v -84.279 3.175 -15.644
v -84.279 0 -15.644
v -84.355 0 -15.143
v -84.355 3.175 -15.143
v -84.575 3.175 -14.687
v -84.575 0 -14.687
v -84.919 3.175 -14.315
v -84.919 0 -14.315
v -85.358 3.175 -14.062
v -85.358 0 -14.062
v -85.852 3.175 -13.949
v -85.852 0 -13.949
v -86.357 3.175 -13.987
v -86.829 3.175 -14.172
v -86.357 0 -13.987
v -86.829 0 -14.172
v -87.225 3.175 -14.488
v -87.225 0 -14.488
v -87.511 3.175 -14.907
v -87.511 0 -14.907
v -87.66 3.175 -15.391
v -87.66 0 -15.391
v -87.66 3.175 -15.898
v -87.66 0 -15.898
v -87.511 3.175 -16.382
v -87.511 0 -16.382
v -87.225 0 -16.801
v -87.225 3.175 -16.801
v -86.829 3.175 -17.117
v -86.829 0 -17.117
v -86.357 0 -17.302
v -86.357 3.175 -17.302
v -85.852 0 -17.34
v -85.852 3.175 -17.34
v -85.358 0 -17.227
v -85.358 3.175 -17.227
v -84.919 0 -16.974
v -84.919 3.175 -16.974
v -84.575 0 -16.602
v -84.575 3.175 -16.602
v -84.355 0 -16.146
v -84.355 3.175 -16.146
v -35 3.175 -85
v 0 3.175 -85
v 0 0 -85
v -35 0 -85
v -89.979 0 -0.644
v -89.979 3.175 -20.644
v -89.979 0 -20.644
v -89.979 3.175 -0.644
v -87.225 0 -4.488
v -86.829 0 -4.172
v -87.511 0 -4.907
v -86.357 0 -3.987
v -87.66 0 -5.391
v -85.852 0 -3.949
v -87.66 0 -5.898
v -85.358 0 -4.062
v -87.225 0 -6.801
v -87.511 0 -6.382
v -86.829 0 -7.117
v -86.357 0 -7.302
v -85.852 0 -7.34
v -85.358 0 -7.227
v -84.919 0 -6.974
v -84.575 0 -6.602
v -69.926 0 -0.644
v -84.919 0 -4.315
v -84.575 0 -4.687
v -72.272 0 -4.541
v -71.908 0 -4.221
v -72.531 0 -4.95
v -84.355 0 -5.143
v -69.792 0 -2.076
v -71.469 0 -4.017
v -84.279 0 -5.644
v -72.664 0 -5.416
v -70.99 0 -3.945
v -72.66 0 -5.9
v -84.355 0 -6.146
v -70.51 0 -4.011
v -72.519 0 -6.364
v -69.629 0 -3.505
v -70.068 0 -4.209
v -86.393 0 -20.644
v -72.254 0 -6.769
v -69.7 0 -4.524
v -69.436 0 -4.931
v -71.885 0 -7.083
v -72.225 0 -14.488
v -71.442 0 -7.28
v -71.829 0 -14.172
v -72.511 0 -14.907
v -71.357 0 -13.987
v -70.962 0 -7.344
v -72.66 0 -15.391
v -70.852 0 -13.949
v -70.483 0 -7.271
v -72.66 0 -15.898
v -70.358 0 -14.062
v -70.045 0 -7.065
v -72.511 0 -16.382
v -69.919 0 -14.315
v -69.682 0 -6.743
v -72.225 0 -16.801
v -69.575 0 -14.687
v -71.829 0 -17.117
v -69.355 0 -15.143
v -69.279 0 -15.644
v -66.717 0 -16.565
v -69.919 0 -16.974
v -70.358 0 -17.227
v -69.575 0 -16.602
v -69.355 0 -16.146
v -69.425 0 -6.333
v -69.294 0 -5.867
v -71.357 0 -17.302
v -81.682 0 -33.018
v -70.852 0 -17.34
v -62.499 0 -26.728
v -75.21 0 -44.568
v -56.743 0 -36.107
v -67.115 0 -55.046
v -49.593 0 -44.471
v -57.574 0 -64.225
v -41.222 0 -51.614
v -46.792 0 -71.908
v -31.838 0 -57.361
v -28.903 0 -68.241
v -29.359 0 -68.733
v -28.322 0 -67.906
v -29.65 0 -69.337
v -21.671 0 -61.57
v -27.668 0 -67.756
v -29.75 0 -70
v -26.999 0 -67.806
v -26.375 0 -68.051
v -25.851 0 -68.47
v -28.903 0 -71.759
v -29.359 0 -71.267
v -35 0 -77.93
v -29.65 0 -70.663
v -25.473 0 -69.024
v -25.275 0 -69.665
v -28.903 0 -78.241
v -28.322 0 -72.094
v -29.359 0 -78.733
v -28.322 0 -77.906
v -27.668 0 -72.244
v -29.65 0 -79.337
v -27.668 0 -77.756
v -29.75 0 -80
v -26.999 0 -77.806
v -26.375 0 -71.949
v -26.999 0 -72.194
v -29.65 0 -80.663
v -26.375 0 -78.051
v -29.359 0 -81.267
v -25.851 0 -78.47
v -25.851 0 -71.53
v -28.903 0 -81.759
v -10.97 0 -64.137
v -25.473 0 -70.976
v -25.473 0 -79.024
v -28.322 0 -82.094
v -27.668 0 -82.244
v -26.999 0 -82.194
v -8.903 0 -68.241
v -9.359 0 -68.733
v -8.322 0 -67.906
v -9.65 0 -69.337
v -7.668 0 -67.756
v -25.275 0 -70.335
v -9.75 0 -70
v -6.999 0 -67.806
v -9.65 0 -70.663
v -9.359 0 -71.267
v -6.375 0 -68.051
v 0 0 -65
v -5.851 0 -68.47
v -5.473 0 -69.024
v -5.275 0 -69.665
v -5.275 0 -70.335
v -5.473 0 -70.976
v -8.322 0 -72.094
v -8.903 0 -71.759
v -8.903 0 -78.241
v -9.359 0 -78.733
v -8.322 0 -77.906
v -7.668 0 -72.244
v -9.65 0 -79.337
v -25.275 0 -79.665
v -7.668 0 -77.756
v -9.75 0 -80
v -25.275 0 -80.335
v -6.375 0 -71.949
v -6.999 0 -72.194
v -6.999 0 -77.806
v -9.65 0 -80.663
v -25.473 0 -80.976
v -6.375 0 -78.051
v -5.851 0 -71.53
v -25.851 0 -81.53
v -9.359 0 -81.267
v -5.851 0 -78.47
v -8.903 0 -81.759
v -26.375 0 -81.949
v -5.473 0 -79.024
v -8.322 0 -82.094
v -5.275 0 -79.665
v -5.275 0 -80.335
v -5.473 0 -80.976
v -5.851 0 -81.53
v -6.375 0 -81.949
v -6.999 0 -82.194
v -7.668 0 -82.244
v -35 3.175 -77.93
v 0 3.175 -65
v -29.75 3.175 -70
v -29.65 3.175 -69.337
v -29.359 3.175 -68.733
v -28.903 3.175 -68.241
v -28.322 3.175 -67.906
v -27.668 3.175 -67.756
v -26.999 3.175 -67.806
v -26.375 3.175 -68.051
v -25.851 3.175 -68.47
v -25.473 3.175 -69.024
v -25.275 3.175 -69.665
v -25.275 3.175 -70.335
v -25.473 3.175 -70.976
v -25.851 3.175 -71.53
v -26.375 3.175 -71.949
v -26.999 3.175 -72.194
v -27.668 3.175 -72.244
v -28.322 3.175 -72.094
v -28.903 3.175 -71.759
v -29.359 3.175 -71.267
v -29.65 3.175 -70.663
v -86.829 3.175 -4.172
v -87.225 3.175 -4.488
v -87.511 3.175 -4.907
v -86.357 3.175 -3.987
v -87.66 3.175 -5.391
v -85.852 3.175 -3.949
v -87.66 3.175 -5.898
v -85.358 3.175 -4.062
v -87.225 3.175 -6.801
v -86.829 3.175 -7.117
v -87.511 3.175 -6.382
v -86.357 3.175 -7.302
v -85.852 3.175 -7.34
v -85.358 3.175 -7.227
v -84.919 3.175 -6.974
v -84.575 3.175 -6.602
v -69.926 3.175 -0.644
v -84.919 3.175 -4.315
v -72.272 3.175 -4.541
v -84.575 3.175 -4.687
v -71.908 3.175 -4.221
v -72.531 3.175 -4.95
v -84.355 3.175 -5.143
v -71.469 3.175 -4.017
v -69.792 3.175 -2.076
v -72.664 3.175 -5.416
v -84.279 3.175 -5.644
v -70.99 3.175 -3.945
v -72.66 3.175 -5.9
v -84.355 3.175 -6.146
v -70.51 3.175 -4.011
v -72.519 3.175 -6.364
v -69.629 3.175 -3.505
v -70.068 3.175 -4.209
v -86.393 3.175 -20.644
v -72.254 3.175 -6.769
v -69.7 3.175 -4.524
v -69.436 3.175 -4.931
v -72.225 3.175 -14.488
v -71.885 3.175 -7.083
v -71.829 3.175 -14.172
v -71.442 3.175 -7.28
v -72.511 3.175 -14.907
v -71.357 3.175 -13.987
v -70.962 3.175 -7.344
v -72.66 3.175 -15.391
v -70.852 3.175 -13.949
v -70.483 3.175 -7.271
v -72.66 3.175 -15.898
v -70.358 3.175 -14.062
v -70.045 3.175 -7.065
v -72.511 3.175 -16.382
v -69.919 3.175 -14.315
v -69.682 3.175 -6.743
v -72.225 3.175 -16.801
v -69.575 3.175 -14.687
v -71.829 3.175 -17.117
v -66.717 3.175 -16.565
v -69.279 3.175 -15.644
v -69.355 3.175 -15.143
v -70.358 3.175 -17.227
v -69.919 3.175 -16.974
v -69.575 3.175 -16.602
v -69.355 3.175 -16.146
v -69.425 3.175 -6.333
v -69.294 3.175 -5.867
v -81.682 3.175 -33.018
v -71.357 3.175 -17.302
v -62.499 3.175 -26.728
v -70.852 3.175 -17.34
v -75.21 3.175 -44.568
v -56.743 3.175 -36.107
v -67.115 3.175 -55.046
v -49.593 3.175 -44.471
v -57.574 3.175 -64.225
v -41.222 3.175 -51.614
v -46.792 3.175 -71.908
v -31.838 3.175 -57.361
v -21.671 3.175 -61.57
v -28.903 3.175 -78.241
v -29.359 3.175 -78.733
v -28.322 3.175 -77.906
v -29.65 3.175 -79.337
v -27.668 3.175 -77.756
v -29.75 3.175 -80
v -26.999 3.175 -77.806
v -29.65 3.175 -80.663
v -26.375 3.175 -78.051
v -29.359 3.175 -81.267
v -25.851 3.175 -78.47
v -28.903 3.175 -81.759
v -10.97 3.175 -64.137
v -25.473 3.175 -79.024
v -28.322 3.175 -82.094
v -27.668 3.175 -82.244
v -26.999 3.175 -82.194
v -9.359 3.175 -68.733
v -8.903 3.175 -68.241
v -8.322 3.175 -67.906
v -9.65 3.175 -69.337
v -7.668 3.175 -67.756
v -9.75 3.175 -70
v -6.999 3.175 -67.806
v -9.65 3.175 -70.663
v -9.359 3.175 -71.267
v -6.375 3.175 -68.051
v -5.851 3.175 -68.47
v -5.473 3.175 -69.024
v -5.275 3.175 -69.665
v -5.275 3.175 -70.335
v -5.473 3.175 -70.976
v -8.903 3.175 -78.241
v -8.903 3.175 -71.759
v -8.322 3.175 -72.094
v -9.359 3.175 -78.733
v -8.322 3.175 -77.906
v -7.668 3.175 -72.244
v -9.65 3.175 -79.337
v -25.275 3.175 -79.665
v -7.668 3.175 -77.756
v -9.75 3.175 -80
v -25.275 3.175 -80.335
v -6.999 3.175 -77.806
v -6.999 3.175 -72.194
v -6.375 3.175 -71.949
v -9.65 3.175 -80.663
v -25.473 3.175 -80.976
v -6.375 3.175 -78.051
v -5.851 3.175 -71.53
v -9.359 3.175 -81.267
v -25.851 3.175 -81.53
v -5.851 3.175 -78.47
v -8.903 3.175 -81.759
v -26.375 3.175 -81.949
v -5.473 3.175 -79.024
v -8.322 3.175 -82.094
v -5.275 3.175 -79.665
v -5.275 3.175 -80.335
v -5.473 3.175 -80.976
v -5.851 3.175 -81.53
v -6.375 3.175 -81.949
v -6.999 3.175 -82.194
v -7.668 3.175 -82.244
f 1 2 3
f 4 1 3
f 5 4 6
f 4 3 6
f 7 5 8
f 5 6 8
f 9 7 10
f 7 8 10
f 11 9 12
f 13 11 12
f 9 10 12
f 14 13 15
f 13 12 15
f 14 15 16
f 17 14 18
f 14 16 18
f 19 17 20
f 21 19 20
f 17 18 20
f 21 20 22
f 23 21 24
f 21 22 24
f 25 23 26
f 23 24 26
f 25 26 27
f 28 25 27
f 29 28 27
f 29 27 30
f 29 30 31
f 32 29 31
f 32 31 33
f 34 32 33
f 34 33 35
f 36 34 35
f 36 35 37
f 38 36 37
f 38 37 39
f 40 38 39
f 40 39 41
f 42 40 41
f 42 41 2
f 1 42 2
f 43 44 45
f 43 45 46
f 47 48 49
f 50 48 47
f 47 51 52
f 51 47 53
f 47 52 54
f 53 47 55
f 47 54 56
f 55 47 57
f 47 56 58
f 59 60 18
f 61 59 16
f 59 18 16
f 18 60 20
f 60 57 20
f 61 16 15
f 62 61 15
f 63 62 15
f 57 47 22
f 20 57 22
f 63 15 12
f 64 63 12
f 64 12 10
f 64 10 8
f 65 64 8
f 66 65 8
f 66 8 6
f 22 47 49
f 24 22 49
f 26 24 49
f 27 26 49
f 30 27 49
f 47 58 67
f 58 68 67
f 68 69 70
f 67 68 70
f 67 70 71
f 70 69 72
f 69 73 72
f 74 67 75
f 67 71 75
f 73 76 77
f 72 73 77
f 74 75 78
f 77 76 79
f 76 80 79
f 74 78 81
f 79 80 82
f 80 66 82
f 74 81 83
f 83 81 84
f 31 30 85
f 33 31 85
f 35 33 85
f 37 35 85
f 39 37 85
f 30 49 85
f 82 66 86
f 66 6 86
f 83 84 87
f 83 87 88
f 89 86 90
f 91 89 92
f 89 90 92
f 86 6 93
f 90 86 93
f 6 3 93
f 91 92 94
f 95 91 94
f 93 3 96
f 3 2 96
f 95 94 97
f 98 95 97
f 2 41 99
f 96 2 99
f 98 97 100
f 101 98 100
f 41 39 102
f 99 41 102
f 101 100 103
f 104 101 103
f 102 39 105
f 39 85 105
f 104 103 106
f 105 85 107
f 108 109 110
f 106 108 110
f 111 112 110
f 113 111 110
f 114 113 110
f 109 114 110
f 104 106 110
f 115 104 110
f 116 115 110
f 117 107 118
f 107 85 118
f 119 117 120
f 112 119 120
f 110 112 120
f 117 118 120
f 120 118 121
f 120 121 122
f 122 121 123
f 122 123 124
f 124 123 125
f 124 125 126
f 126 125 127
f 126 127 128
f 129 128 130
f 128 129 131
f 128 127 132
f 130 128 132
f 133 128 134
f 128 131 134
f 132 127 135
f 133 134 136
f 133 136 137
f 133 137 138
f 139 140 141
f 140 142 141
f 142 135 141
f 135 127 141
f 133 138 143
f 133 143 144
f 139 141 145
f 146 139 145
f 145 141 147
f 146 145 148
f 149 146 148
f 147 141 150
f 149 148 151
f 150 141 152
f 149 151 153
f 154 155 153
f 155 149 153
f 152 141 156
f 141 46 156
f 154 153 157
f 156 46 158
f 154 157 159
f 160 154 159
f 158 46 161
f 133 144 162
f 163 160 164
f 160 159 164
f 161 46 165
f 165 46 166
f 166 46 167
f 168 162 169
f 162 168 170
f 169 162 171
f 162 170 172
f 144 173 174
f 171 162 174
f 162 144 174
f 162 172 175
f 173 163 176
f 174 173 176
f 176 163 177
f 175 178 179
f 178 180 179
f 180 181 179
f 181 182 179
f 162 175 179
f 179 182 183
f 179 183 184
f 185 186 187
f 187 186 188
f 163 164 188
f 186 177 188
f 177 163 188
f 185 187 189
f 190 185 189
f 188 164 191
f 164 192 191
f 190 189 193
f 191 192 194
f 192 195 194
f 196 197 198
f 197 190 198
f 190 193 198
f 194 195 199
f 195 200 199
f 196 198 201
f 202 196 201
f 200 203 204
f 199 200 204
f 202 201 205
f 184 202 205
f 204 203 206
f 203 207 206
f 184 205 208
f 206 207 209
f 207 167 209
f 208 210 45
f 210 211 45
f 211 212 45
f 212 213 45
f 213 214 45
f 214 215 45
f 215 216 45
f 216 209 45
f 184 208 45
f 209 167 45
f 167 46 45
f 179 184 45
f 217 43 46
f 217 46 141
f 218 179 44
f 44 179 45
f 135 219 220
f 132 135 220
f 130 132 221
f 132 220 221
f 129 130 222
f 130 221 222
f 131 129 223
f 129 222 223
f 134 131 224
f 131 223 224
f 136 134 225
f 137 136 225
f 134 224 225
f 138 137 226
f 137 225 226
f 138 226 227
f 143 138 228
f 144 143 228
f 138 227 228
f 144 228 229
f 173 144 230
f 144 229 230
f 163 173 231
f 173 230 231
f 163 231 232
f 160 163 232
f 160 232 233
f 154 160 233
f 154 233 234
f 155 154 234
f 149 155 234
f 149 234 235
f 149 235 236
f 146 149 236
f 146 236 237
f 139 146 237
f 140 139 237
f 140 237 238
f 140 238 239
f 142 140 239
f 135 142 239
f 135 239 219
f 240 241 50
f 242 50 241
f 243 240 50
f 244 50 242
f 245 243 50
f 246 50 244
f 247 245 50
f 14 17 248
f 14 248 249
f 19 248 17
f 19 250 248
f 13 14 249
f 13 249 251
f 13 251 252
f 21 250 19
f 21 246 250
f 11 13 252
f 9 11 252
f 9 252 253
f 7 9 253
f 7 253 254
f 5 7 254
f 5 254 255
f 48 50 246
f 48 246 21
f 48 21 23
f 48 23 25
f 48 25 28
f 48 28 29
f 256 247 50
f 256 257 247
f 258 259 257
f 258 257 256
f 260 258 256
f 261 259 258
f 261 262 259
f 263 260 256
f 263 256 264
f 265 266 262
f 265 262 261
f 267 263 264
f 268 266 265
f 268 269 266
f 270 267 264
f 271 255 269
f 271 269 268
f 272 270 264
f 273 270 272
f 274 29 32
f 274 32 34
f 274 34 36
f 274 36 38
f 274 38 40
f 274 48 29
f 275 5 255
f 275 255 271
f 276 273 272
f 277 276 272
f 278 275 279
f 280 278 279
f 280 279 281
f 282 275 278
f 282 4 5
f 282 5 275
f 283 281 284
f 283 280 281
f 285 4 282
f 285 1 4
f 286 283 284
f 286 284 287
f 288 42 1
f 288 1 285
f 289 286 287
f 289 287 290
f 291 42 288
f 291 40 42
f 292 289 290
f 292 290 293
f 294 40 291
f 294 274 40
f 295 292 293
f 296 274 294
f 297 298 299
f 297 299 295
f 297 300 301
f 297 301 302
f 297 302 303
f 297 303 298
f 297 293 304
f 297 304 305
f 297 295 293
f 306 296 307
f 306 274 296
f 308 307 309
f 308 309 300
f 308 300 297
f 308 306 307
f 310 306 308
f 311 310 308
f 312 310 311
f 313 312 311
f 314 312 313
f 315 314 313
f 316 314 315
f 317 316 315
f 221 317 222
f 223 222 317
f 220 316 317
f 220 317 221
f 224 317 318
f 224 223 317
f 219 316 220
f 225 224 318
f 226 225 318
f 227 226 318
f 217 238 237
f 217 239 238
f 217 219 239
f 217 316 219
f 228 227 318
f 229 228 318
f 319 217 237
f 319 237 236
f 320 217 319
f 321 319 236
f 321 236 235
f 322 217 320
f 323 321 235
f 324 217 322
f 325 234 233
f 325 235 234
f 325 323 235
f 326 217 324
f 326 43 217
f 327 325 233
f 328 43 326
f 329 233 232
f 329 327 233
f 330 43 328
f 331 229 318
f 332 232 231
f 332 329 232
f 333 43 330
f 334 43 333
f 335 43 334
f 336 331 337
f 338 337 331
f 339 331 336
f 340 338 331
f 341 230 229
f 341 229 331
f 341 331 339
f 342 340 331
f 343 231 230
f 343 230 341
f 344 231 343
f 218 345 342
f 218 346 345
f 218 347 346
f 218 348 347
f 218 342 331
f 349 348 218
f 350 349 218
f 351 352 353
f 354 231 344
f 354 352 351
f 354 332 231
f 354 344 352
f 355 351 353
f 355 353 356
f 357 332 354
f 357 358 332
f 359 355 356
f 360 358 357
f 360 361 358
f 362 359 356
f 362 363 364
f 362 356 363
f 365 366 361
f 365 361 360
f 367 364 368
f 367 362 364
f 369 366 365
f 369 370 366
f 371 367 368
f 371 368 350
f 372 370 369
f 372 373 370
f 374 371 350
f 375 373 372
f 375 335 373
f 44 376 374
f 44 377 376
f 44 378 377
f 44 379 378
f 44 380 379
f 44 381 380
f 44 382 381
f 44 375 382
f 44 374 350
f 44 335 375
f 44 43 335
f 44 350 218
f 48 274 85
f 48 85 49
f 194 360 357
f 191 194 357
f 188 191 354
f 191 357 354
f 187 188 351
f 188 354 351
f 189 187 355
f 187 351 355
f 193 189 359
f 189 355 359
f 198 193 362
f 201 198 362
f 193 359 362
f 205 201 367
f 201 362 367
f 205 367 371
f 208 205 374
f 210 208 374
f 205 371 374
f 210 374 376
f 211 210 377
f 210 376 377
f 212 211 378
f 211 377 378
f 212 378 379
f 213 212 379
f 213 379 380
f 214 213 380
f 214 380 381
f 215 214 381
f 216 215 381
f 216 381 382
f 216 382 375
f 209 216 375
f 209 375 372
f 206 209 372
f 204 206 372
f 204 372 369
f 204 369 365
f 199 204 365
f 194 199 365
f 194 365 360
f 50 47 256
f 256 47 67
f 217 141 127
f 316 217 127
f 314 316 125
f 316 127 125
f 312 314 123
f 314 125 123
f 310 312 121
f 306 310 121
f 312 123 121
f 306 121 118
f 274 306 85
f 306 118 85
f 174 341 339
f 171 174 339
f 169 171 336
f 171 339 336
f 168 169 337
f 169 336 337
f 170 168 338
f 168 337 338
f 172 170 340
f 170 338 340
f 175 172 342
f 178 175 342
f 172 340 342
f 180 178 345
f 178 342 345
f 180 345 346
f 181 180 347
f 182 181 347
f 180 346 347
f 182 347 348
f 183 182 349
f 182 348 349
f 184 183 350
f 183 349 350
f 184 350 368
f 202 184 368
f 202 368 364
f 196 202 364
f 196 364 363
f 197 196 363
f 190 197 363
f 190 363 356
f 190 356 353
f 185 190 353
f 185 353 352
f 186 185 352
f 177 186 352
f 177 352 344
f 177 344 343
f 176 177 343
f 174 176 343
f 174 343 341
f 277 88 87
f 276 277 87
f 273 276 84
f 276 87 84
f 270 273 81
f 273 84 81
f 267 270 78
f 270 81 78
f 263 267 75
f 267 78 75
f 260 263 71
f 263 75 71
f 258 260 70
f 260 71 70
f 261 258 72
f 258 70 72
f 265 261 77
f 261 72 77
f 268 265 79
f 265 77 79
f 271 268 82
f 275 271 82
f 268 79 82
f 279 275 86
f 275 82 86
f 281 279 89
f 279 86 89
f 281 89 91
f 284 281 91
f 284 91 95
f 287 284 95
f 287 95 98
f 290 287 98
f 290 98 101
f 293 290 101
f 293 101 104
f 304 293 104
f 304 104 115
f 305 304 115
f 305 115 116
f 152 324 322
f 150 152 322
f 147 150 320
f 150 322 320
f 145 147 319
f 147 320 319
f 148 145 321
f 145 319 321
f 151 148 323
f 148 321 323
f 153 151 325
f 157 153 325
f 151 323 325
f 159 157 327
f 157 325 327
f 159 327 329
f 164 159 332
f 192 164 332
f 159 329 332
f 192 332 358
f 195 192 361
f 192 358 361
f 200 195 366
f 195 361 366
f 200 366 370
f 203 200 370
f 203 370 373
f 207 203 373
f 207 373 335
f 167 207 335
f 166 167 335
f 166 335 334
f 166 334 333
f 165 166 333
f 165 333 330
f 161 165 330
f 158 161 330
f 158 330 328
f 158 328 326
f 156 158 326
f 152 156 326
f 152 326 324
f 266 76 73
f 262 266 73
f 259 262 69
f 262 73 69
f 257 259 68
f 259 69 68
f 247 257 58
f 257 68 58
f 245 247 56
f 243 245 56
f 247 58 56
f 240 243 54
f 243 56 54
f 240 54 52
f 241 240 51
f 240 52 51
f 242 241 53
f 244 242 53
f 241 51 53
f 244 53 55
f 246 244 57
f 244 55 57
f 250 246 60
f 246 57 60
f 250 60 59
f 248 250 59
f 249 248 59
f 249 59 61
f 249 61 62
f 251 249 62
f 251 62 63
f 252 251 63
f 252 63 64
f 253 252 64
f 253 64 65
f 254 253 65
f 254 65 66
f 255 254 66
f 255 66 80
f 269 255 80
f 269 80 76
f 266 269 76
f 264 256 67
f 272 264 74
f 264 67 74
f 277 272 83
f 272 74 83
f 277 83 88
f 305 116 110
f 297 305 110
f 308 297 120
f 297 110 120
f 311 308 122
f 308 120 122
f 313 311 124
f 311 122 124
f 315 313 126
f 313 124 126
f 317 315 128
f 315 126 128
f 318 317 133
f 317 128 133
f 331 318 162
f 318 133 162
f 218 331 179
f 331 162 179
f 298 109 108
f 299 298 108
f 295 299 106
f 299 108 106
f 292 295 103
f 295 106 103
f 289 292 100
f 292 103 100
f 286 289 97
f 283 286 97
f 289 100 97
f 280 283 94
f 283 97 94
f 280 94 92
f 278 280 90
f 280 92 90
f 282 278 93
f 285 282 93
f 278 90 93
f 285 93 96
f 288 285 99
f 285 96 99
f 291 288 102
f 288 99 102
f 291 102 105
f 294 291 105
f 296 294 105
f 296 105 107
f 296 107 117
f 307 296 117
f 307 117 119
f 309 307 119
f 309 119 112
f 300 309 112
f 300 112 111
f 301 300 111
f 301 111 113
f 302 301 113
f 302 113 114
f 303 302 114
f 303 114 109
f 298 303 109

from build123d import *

# Parameters (mm, degrees)
BOSS_EXTRUDE1_DEPTH  = 3.175
BOSS_EXTRUDE2_DEPTH  = 3.175
M4_CLEARANCE_HOLE1_D = 4.5
SKETCH7_R            = 1.7
CUT_EXTRUDE1_DEPTH   = 4.175


with BuildPart() as part:
    # Sketch1 → Boss-Extrude1 (new body)
    with BuildSketch(Plane(origin=(0, 0, 0), x_dir=(1, 0, 0), z_dir=(0, 1, 0))):
        with BuildLine():
            ThreePointArc((0, 85), (-61.668691787, 60.61327124), (-89.979209979, 0.644490644))
            Line((-89.979209979, 0.644490644), (-69.92561449, 0.644490644))
            ThreePointArc((-69.92561449, 0.644490644), (-47.516373878, 46.462349638), (0, 65))
            Line((0, 65), (0, 85))
        make_face()
    extrude(amount=BOSS_EXTRUDE1_DEPTH)

    # Sketch2 → Boss-Extrude2 (add)
    with BuildSketch(Plane(origin=(0, 3.175, 0), x_dir=(1, 0, 0), z_dir=(0, 1, 0))):
        with BuildLine():
            Line((-89.979209979, 20.644490644), (-89.979209979, 0.644490644))
            ThreePointArc((-89.979209979, 0.644490644), (-88.75145348, 10.745821604), (-86.393355856, 20.644490644))
            Line((-86.393355856, 20.644490644), (-89.979209979, 20.644490644))
        make_face()
        with BuildLine():
            Line((-35, 85), (-35, 77.929830117))
            ThreePointArc((-35, 77.929830117), (-17.853482169, 83.214784737), (0, 85))
            Line((0, 85), (-35, 85))
        make_face()
    extrude(amount=-BOSS_EXTRUDE2_DEPTH)

    # M4 Clearance Hole1 (through all)
    with Locations(Plane.XZ):
        with Locations((-27.5, -70), (-7.5, -80), (-27.5, -80), (-7.5, -70)):
            Hole(M4_CLEARANCE_HOLE1_D / 2)

    # Sketch7 → Cut-Extrude1 (cut, through all)
    with BuildSketch(Plane.XZ):
        with Locations((-70.979209979, -15.644490644)):
            Circle(SKETCH7_R)
        with Locations((-85.979209979, -15.644490644)):
            Circle(SKETCH7_R)
        with Locations((-85.979209979, -5.644490644)):
            Circle(SKETCH7_R)
        with Locations((-70.979209979, -5.644490644)):
            Circle(SKETCH7_R)
    extrude(amount=-CUT_EXTRUDE1_DEPTH, mode=Mode.SUBTRACT)


solid = part.part
